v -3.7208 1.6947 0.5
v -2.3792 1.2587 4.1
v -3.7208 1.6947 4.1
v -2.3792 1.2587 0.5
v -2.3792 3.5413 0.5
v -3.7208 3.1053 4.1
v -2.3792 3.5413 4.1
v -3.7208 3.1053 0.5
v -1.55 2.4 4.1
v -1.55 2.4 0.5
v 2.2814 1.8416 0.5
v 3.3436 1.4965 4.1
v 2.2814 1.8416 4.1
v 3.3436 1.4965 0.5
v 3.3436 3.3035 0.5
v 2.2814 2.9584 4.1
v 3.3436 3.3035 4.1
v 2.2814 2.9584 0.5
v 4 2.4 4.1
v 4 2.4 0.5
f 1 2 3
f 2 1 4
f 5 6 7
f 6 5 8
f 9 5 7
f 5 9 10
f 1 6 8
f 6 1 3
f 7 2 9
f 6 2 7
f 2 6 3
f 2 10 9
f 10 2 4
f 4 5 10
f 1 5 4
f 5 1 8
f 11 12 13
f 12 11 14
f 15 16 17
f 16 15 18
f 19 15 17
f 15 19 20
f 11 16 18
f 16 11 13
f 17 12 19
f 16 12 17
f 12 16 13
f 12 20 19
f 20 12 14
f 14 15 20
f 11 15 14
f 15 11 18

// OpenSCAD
union() {
  translate([-2.75, 2.4, 0.5]) cylinder(h=3.6, r=1.2, center=false);
  translate([3.05, 2.4, 0.5]) cylinder(h=3.6, r=0.95, center=false);
}
